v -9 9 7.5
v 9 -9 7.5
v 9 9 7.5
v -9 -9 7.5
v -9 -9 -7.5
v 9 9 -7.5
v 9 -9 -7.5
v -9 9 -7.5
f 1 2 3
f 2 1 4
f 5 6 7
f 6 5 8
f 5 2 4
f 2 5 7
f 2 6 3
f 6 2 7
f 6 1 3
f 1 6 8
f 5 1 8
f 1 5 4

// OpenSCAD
//prusa i3 Z motor support

cube([18,18,15], center = true);
